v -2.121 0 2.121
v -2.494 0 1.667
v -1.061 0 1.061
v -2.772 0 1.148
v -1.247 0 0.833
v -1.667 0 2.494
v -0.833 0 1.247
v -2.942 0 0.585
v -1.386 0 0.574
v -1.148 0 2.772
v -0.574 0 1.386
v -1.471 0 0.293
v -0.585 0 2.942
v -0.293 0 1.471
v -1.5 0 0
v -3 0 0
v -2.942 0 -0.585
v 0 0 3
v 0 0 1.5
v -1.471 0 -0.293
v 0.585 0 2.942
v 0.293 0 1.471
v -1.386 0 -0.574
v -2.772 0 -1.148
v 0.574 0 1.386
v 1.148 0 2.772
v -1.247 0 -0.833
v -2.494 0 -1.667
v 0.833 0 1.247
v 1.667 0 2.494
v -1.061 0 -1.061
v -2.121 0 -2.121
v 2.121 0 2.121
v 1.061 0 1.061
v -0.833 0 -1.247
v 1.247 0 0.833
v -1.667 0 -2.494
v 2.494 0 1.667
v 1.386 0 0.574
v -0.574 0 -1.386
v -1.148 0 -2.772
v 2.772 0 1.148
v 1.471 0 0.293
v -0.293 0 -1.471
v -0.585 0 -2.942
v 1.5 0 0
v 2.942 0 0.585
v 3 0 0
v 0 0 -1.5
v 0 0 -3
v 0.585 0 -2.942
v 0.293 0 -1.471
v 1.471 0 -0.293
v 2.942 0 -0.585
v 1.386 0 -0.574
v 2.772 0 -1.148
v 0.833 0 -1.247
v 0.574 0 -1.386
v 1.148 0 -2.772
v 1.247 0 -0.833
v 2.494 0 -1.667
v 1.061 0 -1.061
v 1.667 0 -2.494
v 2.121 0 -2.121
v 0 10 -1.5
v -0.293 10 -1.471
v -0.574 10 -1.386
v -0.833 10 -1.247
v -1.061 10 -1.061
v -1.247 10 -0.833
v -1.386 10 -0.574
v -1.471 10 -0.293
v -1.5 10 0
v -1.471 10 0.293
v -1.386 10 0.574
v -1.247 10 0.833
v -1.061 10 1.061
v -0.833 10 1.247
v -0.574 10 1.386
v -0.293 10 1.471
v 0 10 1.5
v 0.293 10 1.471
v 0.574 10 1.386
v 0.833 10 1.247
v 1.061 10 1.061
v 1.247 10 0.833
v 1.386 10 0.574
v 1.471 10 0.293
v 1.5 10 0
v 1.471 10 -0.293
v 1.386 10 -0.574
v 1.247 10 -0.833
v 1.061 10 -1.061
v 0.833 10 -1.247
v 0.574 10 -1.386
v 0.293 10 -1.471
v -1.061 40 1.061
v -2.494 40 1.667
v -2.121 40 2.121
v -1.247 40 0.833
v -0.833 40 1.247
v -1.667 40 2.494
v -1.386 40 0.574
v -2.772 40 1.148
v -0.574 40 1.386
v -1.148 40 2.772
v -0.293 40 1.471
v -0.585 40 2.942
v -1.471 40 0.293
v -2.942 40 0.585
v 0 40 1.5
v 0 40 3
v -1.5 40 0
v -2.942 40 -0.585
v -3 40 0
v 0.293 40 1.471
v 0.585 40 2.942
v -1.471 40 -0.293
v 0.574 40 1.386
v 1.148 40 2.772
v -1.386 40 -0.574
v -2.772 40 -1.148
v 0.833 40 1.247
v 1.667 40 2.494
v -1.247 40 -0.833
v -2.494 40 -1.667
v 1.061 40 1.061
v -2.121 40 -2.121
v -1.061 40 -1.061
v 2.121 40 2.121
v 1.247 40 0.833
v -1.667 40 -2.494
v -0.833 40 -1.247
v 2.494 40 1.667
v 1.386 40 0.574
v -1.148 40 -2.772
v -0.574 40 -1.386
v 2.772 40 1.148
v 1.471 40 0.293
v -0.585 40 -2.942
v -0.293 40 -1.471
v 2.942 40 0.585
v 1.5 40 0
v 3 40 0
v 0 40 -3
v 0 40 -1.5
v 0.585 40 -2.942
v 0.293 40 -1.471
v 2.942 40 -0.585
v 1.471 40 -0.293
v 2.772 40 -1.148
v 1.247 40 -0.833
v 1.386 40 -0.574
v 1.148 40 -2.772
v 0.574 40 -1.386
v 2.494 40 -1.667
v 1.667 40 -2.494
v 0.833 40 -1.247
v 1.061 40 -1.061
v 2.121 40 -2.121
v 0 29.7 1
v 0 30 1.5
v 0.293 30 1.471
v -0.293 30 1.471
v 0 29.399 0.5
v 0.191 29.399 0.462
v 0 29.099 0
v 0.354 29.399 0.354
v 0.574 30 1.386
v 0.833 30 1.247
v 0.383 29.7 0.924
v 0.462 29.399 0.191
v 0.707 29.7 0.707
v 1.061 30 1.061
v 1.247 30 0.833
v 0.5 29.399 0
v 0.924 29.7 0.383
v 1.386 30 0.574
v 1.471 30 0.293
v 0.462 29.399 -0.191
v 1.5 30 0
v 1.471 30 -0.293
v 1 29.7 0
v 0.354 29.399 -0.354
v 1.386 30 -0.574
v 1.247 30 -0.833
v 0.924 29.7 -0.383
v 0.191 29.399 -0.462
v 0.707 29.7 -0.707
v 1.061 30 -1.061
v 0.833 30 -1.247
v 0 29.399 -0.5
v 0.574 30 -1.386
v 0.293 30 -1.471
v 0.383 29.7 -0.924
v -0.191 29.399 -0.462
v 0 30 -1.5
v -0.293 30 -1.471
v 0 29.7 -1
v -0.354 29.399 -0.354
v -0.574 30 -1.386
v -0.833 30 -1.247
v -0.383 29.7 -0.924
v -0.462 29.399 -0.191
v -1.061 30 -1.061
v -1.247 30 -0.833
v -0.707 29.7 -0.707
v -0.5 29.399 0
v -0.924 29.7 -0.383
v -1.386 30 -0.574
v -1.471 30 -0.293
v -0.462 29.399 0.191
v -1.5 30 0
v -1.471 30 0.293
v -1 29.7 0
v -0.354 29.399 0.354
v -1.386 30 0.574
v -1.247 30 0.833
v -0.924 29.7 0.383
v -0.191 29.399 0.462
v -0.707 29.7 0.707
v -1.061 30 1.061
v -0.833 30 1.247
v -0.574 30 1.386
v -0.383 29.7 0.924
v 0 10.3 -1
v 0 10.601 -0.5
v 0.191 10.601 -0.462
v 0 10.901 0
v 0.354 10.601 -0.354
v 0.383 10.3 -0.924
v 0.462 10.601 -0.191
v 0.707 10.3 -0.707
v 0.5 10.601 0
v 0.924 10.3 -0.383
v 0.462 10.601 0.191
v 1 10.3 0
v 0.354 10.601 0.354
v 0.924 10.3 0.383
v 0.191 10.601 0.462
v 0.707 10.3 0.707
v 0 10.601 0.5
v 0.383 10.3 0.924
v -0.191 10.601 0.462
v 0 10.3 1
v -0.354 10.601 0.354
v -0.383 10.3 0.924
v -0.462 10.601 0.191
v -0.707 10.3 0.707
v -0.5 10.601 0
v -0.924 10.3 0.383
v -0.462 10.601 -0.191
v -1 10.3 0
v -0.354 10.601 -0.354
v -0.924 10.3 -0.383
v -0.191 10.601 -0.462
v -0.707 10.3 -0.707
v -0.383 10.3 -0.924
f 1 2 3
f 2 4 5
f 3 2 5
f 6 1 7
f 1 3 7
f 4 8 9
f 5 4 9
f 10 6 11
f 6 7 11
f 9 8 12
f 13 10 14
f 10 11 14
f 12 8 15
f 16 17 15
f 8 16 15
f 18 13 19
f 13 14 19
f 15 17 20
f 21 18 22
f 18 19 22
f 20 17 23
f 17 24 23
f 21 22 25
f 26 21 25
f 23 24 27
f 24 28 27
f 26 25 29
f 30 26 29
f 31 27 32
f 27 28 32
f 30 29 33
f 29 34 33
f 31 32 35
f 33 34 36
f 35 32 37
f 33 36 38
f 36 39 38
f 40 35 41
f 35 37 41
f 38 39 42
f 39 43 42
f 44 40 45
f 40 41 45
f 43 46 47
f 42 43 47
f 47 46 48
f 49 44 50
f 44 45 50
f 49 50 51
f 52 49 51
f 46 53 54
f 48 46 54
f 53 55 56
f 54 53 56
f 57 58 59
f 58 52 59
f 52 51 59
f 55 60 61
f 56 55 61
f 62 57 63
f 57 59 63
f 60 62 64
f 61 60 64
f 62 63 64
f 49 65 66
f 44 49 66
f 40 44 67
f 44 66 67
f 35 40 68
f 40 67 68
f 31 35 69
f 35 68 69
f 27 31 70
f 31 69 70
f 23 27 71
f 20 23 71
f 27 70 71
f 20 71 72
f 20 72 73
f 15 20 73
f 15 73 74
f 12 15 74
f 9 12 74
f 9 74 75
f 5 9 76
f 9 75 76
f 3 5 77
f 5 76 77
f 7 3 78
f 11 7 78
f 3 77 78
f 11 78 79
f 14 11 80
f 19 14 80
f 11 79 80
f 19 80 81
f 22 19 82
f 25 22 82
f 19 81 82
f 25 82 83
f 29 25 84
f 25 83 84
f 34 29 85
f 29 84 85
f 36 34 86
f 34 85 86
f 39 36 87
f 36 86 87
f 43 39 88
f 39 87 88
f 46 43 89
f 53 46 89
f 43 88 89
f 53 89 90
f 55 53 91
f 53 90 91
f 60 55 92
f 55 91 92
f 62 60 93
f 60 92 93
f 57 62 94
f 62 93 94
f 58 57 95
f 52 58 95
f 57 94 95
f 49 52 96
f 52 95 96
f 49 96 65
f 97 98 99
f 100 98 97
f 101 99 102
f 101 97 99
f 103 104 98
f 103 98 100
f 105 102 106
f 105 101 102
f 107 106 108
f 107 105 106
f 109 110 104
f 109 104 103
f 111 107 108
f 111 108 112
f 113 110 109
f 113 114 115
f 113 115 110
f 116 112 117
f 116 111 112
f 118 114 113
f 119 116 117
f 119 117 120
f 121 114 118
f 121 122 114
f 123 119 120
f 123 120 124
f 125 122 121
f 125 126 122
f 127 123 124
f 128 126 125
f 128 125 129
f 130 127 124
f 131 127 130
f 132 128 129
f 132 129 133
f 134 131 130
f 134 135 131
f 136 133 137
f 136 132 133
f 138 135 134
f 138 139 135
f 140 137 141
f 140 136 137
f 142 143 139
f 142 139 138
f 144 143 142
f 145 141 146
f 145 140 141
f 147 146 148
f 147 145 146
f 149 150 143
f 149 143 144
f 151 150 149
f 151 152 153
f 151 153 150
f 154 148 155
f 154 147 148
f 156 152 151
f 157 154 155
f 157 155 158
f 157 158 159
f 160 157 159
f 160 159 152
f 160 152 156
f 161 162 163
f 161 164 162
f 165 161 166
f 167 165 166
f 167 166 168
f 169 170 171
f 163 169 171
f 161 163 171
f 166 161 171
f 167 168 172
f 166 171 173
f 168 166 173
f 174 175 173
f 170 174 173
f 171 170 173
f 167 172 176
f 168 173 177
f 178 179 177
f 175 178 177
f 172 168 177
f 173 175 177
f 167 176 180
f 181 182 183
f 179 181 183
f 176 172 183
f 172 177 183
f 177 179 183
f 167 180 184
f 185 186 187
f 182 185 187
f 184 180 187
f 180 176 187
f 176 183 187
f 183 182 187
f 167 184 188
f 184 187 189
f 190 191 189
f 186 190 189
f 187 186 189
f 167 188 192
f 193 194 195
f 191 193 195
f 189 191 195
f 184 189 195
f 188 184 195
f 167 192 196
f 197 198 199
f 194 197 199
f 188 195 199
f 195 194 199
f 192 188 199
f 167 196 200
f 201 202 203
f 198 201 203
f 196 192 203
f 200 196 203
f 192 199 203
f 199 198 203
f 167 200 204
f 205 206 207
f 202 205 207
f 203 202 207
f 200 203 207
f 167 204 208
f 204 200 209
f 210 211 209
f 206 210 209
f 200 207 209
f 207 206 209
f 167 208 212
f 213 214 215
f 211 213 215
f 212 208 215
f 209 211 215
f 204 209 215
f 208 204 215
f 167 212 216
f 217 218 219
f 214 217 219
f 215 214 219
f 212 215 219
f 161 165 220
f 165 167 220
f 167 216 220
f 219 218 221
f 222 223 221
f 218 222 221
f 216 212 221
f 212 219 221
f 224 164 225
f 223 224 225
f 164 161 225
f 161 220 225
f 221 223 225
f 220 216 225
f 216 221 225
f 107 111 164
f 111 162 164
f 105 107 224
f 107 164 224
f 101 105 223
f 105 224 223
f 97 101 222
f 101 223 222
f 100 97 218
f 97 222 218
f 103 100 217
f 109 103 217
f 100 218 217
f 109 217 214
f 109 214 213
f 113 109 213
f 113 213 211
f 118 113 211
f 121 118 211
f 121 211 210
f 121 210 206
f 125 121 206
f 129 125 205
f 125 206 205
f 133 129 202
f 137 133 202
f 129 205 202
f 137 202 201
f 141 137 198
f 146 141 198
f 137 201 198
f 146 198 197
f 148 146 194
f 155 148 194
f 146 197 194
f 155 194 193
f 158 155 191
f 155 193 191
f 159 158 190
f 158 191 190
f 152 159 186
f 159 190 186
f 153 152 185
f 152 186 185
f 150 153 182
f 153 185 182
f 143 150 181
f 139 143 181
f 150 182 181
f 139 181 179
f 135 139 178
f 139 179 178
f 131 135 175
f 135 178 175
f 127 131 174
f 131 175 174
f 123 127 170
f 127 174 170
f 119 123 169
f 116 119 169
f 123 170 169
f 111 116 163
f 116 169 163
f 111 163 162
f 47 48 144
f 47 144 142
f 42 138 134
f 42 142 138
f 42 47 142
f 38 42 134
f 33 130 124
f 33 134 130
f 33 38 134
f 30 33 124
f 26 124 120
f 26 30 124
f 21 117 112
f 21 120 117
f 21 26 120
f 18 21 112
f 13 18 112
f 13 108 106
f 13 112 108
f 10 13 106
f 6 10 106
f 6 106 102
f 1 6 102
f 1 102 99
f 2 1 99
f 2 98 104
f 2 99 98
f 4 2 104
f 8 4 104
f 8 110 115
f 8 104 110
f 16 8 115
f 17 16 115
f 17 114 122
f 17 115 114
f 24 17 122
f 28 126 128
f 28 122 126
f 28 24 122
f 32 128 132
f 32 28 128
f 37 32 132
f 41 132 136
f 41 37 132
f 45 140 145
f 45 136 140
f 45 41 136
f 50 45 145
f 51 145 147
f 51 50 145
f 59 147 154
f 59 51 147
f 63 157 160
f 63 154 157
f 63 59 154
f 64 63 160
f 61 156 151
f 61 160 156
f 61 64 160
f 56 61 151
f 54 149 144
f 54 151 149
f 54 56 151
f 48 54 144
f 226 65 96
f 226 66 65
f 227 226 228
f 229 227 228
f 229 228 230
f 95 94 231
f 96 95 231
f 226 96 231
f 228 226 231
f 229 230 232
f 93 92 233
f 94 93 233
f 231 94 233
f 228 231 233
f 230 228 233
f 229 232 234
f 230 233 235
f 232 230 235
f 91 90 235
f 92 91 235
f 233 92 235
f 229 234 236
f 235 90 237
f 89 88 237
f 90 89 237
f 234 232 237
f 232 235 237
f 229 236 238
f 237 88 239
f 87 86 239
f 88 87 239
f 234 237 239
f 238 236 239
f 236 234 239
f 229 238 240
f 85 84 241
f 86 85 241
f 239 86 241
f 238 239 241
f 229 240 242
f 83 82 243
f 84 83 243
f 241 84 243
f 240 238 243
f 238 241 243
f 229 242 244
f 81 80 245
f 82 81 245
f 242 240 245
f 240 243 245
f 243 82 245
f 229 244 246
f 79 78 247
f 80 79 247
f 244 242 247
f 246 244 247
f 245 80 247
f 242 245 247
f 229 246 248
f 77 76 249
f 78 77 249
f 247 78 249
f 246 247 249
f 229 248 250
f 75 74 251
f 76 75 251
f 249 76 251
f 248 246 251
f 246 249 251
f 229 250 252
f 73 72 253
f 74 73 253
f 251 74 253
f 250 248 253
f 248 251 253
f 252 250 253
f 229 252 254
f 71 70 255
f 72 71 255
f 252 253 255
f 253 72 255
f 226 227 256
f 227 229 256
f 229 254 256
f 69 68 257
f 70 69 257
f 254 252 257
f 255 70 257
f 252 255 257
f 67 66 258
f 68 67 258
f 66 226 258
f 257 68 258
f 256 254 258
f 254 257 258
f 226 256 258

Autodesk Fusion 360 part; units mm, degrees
sketch "Boceto1" plane through (0, 0, 0) normal (0, 1, 0) x (1, 0, 0)
  circle A0 centre (0, 0) radius 3
  dimension "d1" = 6
extrude "Extruir1" add sketch "Boceto1" along normal blind 40
sketch "Boceto2" plane through (0, 40, 0) normal (0, 1, 0) x (-1, 0, 0)
  circle A0 centre (0, 0) radius 3
  circle A1 centre (0, 0) radius 1.525
  dimension "d4" = 3.05
sketch "Boceto3" plane through (0, 0, 0) normal (0, -1, 0) x (1, 0, 0)
  circle A0 centre (0, 0) radius 3
  circle A1 centre (0, 0) radius 1.525
  dimension "d5" = 3.05
hole "Agujero1" at (0, 40, 0) direction (0, -1, 0) diameter 3 depth 10 tip angle 118
hole "Agujero2" at (0, 0, 0) direction (0, 1, 0) diameter 3 depth 10 tip angle 118
